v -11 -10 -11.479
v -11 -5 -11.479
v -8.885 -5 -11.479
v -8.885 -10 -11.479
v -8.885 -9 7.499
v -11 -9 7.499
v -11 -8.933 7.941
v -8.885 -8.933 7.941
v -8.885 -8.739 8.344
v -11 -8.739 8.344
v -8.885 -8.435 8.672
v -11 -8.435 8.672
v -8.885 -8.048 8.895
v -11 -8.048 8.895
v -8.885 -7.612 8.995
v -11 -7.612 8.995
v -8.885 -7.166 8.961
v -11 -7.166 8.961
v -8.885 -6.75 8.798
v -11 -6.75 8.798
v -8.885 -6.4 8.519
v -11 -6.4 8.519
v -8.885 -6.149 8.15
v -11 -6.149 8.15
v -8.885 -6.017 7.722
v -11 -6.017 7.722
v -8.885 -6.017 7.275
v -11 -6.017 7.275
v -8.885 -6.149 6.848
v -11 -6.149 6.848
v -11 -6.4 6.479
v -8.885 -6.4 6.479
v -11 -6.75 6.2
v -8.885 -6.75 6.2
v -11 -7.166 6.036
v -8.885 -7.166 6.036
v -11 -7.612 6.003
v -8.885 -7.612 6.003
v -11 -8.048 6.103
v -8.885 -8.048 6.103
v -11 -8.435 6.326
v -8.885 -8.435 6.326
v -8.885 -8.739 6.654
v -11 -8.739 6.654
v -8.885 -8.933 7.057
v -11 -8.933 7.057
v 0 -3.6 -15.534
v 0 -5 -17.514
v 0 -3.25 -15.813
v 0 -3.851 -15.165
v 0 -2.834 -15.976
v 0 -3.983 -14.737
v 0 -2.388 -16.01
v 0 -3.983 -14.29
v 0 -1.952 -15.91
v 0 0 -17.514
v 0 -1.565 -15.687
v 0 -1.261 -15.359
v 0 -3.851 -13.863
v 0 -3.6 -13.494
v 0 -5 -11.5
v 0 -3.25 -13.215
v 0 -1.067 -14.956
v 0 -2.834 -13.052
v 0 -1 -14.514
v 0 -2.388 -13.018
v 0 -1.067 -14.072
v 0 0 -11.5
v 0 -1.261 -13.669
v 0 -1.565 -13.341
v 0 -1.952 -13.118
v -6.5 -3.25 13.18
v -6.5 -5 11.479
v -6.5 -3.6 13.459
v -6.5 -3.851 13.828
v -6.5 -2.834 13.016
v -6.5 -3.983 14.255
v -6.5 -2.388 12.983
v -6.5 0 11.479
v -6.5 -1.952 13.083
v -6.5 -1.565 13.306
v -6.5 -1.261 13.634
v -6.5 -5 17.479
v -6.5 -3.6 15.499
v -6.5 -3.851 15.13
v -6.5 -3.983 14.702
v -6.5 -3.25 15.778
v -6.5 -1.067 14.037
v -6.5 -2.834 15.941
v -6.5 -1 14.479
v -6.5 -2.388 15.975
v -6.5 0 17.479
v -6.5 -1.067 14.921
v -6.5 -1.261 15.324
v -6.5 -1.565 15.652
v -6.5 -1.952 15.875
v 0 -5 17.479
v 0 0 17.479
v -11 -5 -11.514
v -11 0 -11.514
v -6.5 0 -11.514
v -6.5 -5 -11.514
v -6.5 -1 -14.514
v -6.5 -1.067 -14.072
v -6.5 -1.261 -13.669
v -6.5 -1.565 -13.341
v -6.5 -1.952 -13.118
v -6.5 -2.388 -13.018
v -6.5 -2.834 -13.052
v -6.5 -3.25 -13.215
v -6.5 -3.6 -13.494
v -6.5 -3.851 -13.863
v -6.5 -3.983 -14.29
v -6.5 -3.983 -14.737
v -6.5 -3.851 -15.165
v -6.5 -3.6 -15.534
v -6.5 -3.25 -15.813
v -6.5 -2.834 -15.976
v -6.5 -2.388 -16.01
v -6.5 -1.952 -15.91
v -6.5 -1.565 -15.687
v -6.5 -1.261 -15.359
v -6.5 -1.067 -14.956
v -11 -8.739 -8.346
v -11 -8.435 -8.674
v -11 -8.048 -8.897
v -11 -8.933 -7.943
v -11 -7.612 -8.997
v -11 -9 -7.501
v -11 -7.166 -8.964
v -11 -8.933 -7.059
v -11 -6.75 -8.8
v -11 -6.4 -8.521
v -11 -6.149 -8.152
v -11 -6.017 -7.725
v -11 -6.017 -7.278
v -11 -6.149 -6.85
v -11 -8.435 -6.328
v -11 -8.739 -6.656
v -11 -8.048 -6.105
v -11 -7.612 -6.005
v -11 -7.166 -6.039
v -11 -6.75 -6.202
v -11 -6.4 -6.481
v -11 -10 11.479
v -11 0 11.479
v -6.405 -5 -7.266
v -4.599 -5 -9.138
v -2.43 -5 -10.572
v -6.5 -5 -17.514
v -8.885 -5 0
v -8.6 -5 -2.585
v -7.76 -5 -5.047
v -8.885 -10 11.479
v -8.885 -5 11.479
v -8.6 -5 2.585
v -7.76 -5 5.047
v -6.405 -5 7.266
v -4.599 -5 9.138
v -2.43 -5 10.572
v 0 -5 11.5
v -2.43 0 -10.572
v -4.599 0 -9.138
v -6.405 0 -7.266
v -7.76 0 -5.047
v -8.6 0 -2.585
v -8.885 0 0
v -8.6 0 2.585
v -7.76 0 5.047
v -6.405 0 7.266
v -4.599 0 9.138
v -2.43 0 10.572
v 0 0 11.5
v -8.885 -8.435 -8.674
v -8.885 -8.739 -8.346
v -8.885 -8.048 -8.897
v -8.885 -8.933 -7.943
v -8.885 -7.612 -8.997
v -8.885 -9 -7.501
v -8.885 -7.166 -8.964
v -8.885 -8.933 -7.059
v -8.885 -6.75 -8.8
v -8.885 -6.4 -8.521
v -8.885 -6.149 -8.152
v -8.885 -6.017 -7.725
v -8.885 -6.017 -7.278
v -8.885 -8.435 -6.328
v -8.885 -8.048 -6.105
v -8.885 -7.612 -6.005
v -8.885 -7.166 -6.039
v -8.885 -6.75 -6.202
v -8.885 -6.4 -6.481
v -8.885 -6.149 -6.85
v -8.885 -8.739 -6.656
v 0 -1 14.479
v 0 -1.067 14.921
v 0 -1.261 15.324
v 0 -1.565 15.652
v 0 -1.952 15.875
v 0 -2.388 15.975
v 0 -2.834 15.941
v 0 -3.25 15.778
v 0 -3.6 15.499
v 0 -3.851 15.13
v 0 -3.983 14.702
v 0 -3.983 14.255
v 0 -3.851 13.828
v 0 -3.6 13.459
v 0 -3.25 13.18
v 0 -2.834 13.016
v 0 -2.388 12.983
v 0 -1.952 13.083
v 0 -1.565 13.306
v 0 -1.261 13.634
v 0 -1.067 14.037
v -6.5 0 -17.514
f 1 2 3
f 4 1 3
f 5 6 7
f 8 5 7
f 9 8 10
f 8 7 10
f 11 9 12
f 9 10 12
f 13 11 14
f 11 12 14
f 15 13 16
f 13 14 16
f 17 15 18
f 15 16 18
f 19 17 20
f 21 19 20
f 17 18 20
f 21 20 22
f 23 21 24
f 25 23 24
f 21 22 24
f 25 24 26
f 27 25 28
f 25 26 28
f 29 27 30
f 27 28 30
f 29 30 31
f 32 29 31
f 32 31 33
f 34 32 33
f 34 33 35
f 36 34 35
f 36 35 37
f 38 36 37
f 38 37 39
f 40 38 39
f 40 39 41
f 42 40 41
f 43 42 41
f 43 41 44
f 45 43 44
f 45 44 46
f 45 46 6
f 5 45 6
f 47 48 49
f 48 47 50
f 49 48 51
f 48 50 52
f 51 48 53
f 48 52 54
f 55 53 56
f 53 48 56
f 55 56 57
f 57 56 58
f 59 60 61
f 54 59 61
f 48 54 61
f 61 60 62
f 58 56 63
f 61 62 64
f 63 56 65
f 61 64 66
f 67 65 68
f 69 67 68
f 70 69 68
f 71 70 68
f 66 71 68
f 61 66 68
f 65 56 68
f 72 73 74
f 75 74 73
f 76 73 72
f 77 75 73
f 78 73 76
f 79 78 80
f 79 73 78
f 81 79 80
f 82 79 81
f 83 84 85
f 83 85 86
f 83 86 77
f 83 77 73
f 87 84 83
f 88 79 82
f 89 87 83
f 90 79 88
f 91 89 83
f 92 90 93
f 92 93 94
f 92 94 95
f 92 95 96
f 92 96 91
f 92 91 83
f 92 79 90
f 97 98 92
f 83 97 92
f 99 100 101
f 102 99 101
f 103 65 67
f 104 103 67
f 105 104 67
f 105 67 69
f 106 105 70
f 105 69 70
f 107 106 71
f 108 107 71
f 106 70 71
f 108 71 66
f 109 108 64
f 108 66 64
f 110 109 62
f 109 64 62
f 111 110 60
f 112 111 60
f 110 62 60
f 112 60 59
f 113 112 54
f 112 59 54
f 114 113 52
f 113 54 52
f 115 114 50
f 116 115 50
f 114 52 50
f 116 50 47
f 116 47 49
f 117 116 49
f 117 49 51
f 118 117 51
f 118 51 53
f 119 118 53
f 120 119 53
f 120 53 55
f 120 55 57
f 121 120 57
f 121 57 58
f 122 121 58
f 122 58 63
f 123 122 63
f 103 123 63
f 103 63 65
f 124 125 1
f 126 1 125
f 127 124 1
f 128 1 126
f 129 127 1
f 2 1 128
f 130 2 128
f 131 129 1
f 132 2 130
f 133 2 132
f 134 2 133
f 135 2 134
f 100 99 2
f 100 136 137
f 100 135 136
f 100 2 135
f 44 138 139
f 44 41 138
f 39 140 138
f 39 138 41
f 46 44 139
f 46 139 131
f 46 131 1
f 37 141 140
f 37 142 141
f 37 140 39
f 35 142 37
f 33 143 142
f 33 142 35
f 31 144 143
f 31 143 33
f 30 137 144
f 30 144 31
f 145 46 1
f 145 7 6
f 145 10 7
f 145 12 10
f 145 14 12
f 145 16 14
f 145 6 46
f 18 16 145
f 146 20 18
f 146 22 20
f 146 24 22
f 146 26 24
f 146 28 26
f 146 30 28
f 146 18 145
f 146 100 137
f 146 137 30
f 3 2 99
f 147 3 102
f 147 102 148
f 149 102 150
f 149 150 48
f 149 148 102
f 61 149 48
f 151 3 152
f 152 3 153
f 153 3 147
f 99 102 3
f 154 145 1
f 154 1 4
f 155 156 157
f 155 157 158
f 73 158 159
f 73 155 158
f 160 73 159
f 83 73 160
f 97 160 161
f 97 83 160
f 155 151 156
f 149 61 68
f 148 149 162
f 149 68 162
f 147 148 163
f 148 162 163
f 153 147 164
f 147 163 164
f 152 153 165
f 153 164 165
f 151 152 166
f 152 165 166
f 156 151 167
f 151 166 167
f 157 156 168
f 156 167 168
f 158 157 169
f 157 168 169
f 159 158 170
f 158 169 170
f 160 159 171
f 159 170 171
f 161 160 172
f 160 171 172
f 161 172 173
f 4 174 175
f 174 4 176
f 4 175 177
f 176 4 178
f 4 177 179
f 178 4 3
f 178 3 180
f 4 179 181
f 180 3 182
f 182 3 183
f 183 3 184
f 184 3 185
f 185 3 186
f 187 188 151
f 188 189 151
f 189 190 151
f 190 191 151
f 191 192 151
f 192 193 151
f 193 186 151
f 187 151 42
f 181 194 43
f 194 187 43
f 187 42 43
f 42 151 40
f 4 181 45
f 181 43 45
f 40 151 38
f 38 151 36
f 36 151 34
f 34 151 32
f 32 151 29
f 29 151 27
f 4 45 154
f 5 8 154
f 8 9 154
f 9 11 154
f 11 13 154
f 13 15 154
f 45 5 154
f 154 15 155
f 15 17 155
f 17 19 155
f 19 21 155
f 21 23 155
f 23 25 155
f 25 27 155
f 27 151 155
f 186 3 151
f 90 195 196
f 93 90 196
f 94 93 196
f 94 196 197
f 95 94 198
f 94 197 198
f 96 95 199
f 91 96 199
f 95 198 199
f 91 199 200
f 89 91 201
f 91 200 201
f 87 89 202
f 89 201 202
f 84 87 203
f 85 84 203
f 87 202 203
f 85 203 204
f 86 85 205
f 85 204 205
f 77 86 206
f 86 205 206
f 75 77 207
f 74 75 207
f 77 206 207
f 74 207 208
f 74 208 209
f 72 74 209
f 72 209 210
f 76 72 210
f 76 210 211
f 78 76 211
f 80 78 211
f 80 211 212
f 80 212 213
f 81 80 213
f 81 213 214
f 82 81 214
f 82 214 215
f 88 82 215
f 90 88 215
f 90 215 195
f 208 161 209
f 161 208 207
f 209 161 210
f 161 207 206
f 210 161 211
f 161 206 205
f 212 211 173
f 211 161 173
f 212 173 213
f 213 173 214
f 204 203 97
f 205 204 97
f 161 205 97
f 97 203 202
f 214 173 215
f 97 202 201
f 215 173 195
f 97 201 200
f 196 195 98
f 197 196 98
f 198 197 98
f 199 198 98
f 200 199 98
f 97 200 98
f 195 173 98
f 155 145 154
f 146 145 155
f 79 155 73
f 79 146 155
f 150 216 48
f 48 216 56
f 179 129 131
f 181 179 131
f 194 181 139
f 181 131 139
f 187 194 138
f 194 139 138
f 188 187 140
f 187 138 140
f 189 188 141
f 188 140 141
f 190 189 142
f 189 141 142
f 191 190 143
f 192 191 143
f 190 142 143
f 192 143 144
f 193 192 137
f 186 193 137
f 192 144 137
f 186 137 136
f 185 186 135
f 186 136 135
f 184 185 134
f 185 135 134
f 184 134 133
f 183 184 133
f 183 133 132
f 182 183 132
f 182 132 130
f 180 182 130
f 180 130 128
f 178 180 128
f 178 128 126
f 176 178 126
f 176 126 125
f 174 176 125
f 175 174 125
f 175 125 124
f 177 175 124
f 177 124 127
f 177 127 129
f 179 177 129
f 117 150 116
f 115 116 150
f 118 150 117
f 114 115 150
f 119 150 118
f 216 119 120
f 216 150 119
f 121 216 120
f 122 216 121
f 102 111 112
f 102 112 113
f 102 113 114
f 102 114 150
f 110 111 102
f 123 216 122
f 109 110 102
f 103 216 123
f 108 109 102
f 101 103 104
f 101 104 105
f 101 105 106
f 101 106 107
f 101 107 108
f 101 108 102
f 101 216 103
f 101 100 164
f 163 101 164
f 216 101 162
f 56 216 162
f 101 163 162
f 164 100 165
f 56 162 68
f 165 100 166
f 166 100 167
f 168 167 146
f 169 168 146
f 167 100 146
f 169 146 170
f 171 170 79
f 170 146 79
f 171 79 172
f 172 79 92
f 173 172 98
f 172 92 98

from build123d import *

# Parameters (mm, degrees)
F0_W     = 4.5
F0_H     = 6
F1_DEPTH = 5
F2_R     = 1.5
F3_DEPTH = 25
F4_W     = 2.115136
F4_H     = 22.957688
F5_DEPTH = 5
F6_R     = 1.5
F7_DEPTH = 25


with BuildPart() as f1:
    # F0 (on Front) → F1 (new body)
    with BuildSketch(Plane.XZ):
        with BuildLine():
            ThreePointArc((0, -11.5), (-8.884864, 0), (0, 11.5))
            Line((0, 11.5), (0, 17.478844))
            Line((0, 17.478844), (-2, 17.478844))
            Line((-2, 17.478844), (-2, 11.478844))
            Line((-2, 11.478844), (-6.5, 11.478844))
            Line((-6.5, 11.478844), (-11, 11.478844))
            Line((-11, 11.478844), (-11, -11.513906))
            Line((-11, -11.513906), (-6.5, -11.513906))
            Line((-6.5, -11.513906), (-2, -11.513906))
            Line((-2, -11.513906), (-2, -17.513906))
            Line((-2, -17.513906), (0, -17.513906))
            Line((0, -17.513906), (0, -11.5))
        make_face()
        with Locations((-4.25, 14.478844)):
            Rectangle(F0_W, F0_H)
        with Locations((-4.25, -14.513906)):
            Rectangle(F0_W, F0_H)
    extrude(amount=F1_DEPTH)

    # F2 (on face) → F3 (cut)
    with BuildSketch(Plane.YZ):
        with Locations((-2.5, 14.478844)):
            Circle(F2_R)
        with Locations((-2.5, -14.513906)):
            Circle(F2_R)
    extrude(amount=-F3_DEPTH, mode=Mode.SUBTRACT)

    # F4 (on face) → F5 (join)
    with BuildSketch(Plane.XZ.offset(5)):
        with Locations((-9.942432, 0)):
            Rectangle(F4_W, F4_H)
    extrude(amount=F5_DEPTH)

    # F6 (on face) → F7 (cut)
    with BuildSketch(Plane(origin=(-11, 0, 0), x_dir=(0, -1, 0), z_dir=(-1, 0, 0))):
        with Locations((7.5, 7.498844)):
            Circle(F6_R)
        with Locations((7.5, -7.501156)):
            Circle(F6_R)
    extrude(amount=-F7_DEPTH, mode=Mode.SUBTRACT)


solid = f1.part
